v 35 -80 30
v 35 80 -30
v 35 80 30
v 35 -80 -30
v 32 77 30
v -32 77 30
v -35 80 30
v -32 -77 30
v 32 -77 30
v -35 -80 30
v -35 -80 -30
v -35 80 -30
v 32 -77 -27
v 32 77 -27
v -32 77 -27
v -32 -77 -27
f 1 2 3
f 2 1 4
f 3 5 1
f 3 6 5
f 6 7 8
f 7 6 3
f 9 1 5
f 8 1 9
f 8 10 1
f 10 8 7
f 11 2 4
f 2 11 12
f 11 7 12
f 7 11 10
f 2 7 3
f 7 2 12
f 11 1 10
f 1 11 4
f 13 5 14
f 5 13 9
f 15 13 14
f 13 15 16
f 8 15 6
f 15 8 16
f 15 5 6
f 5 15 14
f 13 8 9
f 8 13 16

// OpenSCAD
// ========================================
// a 70 x 160 x 60 mm enclosure with 3 mm wall thickness
// NeuroCAD canonical IR; dimensions are millimetres
// ========================================
$fn = 48;

difference() {
  cube(size=[70, 160, 60], center=true);
  translate([0, 0, 1.6]) {
    cube(size=[64, 154, 57.2], center=true);
  }
}
